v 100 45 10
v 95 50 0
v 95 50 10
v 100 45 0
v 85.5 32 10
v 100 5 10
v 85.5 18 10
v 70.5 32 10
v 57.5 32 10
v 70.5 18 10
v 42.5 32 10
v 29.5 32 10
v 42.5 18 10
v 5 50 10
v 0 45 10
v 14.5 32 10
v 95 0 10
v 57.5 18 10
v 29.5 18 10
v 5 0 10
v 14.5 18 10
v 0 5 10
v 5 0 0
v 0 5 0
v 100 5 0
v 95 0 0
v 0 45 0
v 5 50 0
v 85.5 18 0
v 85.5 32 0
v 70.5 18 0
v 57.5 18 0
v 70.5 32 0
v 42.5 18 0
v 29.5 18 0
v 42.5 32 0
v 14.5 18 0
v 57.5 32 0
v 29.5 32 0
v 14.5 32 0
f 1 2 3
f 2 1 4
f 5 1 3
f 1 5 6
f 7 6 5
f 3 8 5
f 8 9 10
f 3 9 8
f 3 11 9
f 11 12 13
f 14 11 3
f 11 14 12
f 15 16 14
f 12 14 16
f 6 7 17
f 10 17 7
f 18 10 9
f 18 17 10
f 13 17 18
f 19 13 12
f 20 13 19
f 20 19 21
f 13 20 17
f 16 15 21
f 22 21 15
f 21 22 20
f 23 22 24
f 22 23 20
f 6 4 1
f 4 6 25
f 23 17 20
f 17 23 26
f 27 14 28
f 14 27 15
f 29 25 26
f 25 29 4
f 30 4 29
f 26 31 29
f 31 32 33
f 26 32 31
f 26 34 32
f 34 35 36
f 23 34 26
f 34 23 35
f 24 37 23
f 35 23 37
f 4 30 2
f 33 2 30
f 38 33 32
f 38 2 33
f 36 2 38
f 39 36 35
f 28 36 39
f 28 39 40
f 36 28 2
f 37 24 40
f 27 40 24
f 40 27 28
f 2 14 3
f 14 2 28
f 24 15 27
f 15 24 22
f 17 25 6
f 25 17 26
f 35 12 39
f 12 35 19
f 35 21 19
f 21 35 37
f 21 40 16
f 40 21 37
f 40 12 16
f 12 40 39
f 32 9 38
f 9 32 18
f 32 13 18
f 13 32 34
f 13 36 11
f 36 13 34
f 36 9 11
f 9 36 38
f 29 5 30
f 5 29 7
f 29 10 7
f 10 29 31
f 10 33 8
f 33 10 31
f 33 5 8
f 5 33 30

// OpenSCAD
$fn = 32;

// ----------------------------------------------------------------------
// Windowed plate: 3 voids, 100 x 50 x 10 mm
// ----------------------------------------------------------------------

// --- parameters (mm) ---
plate_l = 100;            // plate length, X
plate_w = 50;             // plate width, Y
plate_t = 10;             // plate thickness, Z
edge_margin = 8;          // wall from the plate edge to any window
windows = 3;              // number of windows in the row
win_l = 15;               // window length
win_w = 14;               // window width
win_pitch = 28;           // window pitch along X
depth_1 = 10;             // depth of void 1 (full thickness = through)
depth_2 = 10;             // depth of void 2 (full thickness = through)
depth_3 = 10;             // depth of void 3 (full thickness = through)
corner_c = 5;             // corner chamfer of the plate

profile = [[5, 0], [95, 0], [100, 5], [100, 45], [95, 50], [5, 50], [0, 45], [0, 5]];  // primary outline, 8 points, counter clockwise
void_1 = [[14.5, 18], [29.5, 18], [29.5, 32], [14.5, 32]];  // window 1 of the row, 4 points
void_2 = [[42.5, 18], [57.5, 18], [57.5, 32], [42.5, 32]];  // window 2 of the row, 4 points
void_3 = [[70.5, 18], [85.5, 18], [85.5, 32], [70.5, 32]];  // window 3 of the row, 4 points

// --- the one profile operation ---
difference() {
  linear_extrude(height = plate_t) polygon(points = profile);
  translate([0, 0, -1])
    linear_extrude(height = plate_t + 2) polygon(points = void_1);
  translate([0, 0, -1])
    linear_extrude(height = plate_t + 2) polygon(points = void_2);
  translate([0, 0, -1])
    linear_extrude(height = plate_t + 2) polygon(points = void_3);
}
